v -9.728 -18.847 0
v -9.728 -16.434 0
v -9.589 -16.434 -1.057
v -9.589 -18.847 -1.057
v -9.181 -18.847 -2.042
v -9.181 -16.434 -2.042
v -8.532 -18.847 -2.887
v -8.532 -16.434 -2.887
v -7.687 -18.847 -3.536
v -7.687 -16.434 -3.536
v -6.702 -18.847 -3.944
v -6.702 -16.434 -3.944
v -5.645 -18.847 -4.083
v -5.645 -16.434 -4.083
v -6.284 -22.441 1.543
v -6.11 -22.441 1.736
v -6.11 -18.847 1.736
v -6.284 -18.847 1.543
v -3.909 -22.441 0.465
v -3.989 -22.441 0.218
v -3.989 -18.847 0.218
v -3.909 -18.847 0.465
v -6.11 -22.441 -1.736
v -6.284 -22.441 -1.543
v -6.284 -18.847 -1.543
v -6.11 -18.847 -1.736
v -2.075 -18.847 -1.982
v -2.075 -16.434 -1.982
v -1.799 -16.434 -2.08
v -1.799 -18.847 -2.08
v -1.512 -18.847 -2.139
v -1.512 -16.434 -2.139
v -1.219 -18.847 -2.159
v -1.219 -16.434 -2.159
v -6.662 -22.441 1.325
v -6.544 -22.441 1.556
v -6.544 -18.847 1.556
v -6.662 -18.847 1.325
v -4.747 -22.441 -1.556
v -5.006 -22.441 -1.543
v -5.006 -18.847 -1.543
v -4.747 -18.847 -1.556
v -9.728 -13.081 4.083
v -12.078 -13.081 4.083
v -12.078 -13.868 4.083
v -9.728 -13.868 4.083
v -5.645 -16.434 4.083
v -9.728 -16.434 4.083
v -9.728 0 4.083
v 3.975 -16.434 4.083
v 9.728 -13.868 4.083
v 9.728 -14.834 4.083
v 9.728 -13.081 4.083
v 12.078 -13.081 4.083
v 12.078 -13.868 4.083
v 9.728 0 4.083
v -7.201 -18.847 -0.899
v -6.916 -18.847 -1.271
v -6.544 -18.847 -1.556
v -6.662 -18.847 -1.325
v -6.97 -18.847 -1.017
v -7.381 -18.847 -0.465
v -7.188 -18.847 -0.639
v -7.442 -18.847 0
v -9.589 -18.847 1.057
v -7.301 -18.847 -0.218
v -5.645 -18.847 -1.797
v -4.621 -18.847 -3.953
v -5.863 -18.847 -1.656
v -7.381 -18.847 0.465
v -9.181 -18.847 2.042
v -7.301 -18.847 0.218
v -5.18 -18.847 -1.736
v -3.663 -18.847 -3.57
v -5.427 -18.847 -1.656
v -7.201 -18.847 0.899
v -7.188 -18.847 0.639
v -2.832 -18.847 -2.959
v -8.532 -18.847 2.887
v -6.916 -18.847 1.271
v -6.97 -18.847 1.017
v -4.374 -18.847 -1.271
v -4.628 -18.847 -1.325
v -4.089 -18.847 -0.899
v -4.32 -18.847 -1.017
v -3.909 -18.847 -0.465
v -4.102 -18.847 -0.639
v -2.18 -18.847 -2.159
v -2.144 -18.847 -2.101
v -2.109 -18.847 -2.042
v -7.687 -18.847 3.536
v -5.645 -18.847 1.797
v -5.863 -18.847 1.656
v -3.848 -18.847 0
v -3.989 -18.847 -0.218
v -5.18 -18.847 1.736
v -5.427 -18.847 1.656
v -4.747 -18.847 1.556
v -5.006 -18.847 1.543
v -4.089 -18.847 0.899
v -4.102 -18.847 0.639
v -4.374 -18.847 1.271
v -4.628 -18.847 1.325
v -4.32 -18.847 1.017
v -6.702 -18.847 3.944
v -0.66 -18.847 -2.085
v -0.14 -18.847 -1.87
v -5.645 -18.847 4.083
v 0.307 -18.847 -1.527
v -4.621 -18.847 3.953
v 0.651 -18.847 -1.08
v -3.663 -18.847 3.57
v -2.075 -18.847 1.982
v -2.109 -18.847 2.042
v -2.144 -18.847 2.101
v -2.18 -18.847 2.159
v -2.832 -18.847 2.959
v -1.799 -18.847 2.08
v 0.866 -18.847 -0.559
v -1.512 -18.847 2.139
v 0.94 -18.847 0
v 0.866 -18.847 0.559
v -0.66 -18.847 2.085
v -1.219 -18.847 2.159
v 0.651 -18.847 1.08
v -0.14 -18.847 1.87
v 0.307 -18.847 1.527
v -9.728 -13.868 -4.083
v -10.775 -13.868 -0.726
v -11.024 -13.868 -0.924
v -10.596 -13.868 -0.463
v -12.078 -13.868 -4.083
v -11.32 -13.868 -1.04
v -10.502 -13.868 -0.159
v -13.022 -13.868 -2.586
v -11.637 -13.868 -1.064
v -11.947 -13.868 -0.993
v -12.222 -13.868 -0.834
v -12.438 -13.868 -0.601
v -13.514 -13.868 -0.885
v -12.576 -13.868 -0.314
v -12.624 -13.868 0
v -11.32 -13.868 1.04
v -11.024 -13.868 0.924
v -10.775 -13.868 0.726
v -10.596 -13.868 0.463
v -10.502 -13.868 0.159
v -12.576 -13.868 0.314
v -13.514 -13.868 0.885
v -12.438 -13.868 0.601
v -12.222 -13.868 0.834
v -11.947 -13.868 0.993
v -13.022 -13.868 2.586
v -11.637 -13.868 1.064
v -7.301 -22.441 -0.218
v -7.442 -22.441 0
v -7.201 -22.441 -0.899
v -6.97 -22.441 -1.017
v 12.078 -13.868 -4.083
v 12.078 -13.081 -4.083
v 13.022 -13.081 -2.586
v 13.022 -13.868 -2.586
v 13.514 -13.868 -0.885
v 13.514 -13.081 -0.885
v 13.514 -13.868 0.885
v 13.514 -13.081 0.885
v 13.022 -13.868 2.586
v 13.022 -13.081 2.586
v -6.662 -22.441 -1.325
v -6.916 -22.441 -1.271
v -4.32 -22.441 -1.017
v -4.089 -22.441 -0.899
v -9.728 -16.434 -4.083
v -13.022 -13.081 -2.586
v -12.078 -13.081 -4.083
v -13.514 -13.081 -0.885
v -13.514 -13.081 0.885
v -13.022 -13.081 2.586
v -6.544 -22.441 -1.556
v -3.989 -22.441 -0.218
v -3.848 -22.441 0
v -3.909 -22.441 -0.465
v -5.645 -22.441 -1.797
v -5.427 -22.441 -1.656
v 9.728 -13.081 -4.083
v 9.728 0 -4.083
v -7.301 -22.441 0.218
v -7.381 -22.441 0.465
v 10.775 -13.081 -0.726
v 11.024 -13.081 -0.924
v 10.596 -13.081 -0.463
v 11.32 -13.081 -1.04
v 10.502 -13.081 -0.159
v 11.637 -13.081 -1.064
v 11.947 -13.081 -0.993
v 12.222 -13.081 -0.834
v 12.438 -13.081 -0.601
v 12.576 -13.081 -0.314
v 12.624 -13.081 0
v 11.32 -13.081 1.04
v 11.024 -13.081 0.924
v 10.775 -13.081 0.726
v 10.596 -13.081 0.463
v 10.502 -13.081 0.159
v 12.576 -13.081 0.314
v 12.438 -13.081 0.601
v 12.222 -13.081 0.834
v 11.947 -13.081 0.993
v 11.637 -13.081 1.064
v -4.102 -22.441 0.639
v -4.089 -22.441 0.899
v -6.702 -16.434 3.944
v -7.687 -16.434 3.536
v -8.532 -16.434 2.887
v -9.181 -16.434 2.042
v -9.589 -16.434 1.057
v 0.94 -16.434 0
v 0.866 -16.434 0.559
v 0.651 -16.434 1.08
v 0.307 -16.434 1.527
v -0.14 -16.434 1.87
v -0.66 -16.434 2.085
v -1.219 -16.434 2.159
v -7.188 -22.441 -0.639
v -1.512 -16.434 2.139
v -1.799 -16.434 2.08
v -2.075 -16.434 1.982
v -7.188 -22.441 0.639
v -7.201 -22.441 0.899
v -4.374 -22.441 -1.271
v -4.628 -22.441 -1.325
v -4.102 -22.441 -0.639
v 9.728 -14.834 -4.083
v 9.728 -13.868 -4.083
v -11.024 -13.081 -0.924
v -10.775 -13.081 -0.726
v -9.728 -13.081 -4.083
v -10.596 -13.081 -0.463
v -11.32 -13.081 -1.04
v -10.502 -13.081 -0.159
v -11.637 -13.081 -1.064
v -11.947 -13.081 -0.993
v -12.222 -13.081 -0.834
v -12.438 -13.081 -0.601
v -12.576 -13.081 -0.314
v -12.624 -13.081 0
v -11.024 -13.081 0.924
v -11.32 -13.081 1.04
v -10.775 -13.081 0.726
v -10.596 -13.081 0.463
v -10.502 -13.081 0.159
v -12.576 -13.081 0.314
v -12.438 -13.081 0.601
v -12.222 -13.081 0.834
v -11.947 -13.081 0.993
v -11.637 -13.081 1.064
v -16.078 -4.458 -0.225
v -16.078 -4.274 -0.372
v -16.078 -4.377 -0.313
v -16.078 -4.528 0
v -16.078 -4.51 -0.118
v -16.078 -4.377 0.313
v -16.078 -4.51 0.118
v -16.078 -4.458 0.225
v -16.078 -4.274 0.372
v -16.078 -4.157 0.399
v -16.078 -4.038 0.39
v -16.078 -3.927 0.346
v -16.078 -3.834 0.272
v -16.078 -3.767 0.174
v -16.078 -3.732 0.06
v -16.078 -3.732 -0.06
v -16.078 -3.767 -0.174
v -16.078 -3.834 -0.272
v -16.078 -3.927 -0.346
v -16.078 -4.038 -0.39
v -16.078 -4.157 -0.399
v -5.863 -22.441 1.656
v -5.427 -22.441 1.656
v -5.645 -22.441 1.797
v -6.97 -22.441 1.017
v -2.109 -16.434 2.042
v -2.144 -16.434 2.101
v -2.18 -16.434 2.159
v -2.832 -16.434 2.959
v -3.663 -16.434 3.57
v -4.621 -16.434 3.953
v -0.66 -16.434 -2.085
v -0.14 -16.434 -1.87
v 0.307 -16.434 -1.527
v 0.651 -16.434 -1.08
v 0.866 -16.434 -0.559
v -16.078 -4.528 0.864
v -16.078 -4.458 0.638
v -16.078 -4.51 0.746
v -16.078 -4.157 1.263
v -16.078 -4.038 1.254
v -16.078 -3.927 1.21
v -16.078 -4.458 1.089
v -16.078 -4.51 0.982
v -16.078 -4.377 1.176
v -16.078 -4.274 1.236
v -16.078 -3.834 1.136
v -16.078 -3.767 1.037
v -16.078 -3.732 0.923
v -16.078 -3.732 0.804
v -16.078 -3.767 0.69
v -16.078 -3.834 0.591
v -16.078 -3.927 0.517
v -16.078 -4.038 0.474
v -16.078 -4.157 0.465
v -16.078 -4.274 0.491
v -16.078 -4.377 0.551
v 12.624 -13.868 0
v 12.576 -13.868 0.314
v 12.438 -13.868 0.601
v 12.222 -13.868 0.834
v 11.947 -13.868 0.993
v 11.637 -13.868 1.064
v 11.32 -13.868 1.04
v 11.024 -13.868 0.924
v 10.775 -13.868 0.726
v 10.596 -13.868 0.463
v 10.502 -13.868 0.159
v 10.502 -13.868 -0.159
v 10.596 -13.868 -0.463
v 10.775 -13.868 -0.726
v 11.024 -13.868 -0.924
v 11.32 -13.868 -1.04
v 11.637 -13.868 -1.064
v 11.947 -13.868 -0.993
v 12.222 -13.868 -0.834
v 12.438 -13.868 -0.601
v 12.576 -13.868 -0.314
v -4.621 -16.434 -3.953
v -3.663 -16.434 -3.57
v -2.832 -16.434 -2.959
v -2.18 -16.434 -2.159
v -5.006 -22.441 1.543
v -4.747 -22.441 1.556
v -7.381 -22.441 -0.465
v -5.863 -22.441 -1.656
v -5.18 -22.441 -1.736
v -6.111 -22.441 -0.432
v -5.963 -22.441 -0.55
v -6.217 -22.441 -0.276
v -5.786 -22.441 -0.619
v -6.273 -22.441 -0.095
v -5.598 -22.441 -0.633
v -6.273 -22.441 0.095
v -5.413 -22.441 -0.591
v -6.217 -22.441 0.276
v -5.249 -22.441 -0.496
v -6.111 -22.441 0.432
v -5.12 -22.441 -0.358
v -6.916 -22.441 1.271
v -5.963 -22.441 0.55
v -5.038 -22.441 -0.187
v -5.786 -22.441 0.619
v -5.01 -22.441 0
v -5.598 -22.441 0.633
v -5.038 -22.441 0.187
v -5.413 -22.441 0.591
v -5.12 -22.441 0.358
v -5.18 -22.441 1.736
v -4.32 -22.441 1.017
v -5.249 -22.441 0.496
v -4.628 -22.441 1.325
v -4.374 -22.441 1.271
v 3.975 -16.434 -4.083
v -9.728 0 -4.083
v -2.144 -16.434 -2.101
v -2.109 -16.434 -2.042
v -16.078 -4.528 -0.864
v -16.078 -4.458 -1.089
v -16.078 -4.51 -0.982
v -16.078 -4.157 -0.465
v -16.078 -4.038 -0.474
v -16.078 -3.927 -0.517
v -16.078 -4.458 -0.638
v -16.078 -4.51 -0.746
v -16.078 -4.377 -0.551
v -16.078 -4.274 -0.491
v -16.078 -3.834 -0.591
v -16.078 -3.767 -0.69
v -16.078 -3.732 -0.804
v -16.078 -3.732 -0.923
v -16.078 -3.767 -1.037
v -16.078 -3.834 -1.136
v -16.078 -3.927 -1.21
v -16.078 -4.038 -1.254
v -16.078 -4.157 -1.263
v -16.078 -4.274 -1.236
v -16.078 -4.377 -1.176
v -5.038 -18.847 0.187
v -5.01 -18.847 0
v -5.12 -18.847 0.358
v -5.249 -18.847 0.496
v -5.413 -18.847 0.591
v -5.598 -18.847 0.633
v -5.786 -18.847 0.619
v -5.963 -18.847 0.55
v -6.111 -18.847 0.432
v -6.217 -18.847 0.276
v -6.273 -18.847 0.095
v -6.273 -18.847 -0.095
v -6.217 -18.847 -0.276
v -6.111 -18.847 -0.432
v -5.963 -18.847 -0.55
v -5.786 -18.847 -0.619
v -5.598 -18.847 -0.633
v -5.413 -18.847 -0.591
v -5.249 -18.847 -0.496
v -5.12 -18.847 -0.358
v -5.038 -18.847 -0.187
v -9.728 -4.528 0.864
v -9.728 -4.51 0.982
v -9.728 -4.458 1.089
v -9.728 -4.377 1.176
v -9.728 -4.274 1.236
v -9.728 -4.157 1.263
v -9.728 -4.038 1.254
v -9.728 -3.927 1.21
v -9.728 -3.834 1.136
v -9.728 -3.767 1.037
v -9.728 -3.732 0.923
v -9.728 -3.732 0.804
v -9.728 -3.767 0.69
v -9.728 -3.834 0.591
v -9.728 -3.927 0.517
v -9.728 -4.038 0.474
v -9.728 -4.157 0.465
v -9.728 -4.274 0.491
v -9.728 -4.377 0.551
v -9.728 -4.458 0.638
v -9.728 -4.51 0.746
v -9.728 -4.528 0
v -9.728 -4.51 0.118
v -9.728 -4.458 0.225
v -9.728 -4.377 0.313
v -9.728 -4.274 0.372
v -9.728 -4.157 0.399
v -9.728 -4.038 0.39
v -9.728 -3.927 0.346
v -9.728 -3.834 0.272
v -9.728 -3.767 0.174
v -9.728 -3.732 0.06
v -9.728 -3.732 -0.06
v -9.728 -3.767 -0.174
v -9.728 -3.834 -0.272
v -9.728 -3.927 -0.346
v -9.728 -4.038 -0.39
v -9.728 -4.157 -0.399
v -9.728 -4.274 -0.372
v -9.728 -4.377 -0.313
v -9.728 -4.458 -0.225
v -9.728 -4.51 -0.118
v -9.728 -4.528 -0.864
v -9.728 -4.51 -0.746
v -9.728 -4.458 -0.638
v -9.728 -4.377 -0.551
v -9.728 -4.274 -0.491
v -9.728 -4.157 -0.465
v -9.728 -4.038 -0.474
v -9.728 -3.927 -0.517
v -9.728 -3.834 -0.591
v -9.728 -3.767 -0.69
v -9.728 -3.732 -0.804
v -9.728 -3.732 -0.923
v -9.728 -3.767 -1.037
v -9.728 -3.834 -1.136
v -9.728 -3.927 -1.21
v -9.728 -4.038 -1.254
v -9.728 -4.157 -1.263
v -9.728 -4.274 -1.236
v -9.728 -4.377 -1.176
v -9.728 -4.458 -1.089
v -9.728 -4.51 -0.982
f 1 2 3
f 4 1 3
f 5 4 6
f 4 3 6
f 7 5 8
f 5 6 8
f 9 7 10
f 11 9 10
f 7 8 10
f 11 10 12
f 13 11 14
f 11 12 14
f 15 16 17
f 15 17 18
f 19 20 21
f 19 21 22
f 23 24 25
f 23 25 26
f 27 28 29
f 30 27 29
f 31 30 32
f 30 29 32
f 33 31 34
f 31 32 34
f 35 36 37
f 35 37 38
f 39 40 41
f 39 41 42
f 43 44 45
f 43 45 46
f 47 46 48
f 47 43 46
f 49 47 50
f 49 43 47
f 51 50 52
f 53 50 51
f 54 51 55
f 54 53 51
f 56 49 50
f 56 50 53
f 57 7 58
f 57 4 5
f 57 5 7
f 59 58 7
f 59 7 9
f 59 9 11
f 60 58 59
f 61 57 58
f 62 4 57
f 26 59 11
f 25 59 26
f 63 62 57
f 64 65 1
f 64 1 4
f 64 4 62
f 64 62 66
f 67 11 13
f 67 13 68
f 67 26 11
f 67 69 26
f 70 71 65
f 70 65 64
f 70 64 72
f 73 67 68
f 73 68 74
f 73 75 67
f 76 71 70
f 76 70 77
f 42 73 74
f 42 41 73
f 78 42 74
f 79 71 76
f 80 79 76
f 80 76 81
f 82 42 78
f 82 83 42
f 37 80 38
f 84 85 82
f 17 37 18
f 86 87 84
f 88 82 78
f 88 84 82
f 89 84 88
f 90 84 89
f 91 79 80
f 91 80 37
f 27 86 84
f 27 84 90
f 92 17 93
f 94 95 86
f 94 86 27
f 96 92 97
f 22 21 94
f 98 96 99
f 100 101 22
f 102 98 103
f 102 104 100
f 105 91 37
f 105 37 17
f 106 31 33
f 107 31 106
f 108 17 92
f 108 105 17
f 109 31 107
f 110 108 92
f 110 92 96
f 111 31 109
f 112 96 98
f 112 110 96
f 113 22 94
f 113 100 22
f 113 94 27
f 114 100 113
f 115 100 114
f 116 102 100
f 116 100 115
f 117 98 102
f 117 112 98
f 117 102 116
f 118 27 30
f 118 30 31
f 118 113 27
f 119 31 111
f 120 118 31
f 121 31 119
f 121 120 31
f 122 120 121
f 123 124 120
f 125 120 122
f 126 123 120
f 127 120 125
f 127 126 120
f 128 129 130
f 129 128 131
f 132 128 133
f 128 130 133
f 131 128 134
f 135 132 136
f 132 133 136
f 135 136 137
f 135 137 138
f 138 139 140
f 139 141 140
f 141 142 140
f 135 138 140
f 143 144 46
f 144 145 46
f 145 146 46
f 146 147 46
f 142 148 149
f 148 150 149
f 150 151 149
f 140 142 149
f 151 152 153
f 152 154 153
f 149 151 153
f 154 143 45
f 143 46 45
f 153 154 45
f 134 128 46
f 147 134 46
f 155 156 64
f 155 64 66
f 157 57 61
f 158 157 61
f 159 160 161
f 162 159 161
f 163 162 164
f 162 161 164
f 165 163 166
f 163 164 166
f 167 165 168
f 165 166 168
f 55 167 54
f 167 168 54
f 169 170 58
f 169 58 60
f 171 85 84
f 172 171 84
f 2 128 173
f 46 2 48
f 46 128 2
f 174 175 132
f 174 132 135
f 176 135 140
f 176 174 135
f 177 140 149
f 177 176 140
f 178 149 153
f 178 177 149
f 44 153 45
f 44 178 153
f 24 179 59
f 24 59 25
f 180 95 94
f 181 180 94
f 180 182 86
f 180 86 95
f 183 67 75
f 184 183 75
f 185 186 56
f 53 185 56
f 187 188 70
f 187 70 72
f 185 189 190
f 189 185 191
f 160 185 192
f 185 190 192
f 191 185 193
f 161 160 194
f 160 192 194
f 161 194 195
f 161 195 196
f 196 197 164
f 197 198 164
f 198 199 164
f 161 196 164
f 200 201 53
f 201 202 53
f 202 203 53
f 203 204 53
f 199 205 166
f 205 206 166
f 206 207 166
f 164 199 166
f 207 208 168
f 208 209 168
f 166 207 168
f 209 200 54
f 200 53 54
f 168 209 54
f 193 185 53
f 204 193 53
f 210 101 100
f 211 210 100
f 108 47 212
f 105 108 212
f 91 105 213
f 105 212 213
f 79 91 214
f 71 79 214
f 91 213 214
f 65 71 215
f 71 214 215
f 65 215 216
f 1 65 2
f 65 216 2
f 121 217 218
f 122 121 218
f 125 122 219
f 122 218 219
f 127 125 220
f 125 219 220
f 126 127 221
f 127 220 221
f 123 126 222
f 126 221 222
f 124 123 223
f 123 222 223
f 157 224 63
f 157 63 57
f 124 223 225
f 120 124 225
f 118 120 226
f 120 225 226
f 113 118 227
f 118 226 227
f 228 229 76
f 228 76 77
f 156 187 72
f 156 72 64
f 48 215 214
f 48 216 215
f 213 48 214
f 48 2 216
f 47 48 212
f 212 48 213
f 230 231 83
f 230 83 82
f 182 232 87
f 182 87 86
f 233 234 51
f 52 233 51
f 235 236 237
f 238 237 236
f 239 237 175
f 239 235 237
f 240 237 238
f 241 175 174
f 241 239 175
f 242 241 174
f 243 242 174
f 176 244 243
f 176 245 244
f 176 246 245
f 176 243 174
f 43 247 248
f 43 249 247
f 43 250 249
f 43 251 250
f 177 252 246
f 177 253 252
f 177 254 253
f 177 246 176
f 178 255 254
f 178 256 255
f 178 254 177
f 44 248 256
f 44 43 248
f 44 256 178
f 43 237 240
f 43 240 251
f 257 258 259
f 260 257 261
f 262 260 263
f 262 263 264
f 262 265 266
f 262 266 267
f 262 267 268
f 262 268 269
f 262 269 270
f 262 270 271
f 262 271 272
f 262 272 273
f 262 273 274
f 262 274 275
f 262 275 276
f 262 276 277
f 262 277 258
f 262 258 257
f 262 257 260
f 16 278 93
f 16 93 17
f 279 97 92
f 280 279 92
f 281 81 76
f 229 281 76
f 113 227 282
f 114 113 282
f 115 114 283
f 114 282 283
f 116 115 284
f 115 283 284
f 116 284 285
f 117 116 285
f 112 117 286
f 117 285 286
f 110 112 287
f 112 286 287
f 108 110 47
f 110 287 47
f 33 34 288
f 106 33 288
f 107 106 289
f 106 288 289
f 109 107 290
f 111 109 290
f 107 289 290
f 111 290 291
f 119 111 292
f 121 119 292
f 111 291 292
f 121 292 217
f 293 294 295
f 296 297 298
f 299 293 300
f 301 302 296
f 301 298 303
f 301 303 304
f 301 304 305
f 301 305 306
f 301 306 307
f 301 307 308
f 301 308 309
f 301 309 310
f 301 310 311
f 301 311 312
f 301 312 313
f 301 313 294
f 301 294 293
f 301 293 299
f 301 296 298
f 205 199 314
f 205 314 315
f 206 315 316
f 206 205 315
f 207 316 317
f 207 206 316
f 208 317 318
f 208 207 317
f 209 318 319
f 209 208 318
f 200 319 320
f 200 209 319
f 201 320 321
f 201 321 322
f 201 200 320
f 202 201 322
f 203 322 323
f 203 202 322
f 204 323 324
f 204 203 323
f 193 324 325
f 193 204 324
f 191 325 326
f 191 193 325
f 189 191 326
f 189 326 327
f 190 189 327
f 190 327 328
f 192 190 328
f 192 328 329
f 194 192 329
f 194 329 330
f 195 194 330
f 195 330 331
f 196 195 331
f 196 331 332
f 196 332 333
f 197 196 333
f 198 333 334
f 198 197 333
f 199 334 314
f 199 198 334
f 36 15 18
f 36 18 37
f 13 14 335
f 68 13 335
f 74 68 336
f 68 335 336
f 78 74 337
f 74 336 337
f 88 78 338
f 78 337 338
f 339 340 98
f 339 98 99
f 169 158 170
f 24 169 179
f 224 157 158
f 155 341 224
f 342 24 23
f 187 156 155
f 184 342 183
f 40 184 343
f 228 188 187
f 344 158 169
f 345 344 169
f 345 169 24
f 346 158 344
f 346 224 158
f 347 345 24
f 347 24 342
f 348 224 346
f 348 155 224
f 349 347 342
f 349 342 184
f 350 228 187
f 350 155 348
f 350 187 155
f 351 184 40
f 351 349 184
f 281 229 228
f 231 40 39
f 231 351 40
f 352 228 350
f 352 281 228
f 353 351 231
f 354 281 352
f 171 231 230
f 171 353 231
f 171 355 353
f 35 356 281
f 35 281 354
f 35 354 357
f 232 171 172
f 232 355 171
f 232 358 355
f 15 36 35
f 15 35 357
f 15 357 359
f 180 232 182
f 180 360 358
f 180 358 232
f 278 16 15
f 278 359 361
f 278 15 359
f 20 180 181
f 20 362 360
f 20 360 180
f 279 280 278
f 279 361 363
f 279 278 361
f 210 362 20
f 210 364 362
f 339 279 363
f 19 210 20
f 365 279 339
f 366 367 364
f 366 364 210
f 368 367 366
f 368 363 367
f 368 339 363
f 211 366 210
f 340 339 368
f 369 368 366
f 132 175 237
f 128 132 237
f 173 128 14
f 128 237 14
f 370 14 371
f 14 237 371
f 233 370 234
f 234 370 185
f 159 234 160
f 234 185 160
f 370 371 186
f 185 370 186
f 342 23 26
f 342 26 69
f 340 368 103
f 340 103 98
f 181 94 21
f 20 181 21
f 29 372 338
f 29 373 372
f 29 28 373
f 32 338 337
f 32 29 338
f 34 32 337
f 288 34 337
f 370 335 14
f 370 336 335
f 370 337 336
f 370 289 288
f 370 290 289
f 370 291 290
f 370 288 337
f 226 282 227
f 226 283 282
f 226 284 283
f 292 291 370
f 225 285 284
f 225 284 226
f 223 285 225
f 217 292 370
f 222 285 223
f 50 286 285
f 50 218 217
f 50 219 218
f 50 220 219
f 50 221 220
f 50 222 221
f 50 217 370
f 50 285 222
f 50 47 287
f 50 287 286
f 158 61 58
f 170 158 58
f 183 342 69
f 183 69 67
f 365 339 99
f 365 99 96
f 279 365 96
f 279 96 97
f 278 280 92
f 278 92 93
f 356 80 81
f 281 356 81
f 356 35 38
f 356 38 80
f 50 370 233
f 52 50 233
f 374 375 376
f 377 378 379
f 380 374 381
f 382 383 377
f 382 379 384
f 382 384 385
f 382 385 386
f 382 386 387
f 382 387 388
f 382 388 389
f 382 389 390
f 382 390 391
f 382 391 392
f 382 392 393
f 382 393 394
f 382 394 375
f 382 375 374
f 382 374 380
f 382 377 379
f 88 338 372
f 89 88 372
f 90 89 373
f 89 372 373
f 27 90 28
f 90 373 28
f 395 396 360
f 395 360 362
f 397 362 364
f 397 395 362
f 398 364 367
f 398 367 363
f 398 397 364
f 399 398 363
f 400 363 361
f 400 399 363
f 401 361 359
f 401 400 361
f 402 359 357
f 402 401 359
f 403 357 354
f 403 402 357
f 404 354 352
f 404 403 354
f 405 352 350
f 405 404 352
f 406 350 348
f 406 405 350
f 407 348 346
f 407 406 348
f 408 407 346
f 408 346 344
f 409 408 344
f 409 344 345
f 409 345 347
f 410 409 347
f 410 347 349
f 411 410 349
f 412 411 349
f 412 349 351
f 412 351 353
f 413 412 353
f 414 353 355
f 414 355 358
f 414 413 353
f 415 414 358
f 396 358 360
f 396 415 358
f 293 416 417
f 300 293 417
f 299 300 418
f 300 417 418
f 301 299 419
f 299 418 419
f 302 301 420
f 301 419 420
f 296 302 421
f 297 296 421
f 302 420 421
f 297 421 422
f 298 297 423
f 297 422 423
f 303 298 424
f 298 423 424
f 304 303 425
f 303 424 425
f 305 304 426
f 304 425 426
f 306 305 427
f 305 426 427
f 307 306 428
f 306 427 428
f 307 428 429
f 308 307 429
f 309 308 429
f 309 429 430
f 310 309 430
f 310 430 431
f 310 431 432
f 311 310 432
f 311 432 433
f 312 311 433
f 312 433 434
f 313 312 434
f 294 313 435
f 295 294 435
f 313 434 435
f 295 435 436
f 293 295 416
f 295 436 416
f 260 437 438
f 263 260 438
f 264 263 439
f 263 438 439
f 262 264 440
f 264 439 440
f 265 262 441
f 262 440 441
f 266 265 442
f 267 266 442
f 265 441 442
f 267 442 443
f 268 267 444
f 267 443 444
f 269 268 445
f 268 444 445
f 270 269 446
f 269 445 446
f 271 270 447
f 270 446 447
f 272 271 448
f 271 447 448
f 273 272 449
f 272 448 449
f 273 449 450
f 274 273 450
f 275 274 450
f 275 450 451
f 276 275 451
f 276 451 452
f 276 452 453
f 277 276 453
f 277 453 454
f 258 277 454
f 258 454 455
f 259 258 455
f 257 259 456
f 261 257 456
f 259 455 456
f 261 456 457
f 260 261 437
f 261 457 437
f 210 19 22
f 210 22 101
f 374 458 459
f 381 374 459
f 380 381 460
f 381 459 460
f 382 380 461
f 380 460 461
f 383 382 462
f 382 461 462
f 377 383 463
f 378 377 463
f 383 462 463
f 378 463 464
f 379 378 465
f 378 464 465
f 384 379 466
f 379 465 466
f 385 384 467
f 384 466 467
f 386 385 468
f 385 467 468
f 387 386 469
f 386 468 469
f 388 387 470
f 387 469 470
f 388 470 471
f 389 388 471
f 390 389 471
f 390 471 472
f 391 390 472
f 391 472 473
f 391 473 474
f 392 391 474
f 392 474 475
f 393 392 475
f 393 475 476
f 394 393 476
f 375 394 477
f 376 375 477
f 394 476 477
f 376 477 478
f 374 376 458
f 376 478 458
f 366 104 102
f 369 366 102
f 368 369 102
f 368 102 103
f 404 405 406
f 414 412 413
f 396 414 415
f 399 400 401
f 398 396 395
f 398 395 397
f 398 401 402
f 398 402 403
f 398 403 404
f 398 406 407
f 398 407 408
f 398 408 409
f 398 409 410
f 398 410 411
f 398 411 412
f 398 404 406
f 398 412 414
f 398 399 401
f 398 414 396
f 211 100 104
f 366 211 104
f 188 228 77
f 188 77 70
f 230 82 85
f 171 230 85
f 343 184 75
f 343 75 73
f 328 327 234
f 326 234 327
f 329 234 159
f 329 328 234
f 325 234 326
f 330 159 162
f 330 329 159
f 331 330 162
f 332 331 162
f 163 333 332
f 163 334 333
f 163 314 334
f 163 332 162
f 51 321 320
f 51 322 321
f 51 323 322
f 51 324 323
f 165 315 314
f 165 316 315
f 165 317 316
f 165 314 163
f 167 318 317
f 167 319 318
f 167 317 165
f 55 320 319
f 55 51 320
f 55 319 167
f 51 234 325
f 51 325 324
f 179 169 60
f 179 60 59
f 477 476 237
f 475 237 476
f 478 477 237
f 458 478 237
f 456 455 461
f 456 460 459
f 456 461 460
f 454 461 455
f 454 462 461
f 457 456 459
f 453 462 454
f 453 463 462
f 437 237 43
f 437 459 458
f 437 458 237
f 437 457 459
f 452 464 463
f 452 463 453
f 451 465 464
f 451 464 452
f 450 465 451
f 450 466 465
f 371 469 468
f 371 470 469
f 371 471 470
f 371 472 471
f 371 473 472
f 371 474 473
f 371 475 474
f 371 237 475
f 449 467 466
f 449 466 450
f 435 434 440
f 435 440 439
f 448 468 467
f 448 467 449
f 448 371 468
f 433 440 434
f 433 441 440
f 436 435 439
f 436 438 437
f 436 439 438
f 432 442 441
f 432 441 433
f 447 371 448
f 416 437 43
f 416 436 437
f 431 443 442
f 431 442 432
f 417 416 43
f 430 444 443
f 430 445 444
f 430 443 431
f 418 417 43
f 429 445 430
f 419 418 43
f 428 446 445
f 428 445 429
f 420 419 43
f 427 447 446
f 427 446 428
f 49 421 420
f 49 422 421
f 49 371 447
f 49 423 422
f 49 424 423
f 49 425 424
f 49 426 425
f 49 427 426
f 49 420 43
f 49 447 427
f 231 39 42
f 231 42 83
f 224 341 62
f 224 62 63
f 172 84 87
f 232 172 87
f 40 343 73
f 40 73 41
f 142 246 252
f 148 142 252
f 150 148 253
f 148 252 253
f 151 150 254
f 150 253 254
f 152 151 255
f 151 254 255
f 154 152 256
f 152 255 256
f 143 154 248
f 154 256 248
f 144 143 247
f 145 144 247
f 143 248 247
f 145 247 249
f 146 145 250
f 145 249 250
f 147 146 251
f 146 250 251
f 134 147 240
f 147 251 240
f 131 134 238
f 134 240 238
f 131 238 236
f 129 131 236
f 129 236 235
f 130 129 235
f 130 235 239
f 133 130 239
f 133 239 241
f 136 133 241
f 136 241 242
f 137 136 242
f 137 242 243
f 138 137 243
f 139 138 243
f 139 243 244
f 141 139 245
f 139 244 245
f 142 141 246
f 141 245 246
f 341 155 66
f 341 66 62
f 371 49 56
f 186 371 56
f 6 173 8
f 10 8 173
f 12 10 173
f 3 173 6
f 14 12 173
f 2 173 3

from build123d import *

# Parameters (mm, degrees)
F0_W      = 19.4564
F0_H      = 8.1661
F1_DEPTH  = 16.4338
F3_DEPTH  = 8.1661
F5_DEPTH  = 2.413
F6_R      = 0.635
F7_DEPTH  = 3.5941
F9_R      = 1.0668
F10_DEPTH = 0.7874
F11_R     = 0.40005
F12_DEPTH = 6.35


# Not quite as in the source:
# - a pattern or mirror of a feature is missing from the dataset's text; its kind, count and spacing are read off the source's solid


with BuildPart() as f1:
    # F0 (on Front) → F1 (new body)
    with BuildSketch(Plane.XZ):
        Rectangle(F0_W, F0_H)
    extrude(amount=F1_DEPTH)

    # F2 (on face) → F3 (cut, through all)
    with BuildSketch(Plane(origin=(0, 0, -4.08305), x_dir=(1, 0, 0), z_dir=(0, 0, -1))):
        Polygon((3.9751, 16.4338), (9.7282, 14.8336), (9.7282, 16.4338), align=None)
    extrude(amount=-F3_DEPTH, mode=Mode.SUBTRACT)

    # F4 (on face) → F5 (join)
    with BuildSketch(Plane.XZ.offset(16.4338)):
        with BuildLine():
            ThreePointArc((-2.0754022956, -1.9819683724), (-3.3782, 0), (-2.0754022956, 1.9819683724))
            ThreePointArc((-2.0754022956, 1.9819683724), (-2.1263891254, 2.071139592), (-2.1796029577, 2.159))
            ThreePointArc((-2.1796029577, 2.159), (-3.6632327094, 3.5697760652), (-5.6451500171, 4.08305))
            ThreePointArc((-5.6451500171, 4.08305), (-8.532302349, 2.8871523369), (-9.7282, 0))
            ThreePointArc((-9.7282, 0), (-8.5323023429, -2.8871523429), (-5.64515, -4.08305))
            ThreePointArc((-5.64515, -4.08305), (-3.663232702, -3.5697760611), (-2.1796029577, -2.159))
            ThreePointArc((-2.1796029577, -2.159), (-2.1263891254, -2.071139592), (-2.0754022956, -1.9819683724))
        make_face()
        with BuildLine():
            ThreePointArc((-2.0754022956, -1.9819683724), (-1.6925081197, -1.023679378), (-1.5621, 0))
            ThreePointArc((-1.5621, 0), (-1.6925081197, 1.023679378), (-2.0754022956, 1.9819683724))
            ThreePointArc((-2.0754022956, 1.9819683724), (-3.3782, 0), (-2.0754022956, -1.9819683724))
        make_face()
        with BuildLine():
            ThreePointArc((-2.0754022956, 1.9819683724), (-1.6925081197, 1.023679378), (-1.5621, 0))
            ThreePointArc((-1.5621, 0), (-1.6925081197, -1.023679378), (-2.0754022956, -1.9819683724))
            ThreePointArc((-2.0754022956, -1.9819683724), (-1.656356313, -2.1142789215), (-1.2192, -2.159))
            ThreePointArc((-1.2192, -2.159), (0.3074435406, -1.5266435406), (0.9398, 0))
            ThreePointArc((0.9398, 0), (0.3074435406, 1.5266435406), (-1.2192, 2.159))
            ThreePointArc((-1.2192, 2.159), (-1.656356313, 2.1142789215), (-2.0754022956, 1.9819683724))
        make_face()
    extrude(amount=F5_DEPTH)

    # F6 (on face) → F7 (join)
    with BuildSketch(Plane.XZ.offset(18.8468)):
        Polygon((-5.4271647327, 1.6557624907), (-5.64515, 1.79705), (-5.8631352673, 1.6557624907), (-6.110260765, 1.7358170061), (-6.2842504662, 1.5429250133), (-6.543675, 1.5562909519), (-6.6618120245, 1.324939746), (-6.9158562411, 1.2707062411), (-6.970089746, 1.0166620245), (-7.2014409519, 0.898525), (-7.1880750133, 0.6391004662), (-7.3809670061, 0.465110765), (-7.3009124907, 0.2179852673), (-7.4422, 0), (-7.3009124907, -0.2179852673), (-7.3809670061, -0.465110765), (-7.1880750133, -0.6391004662), (-7.2014409519, -0.898525), (-6.970089746, -1.0166620245), (-6.9158562411, -1.2707062411), (-6.6618120245, -1.324939746), (-6.543675, -1.5562909519), (-6.2842504662, -1.5429250133), (-6.110260765, -1.7358170061), (-5.8631352673, -1.6557624907), (-5.64515, -1.79705), (-5.4271647327, -1.6557624907), (-5.180039235, -1.7358170061), (-5.0060495338, -1.5429250133), (-4.746625, -1.5562909519), (-4.6284879755, -1.324939746), (-4.3744437589, -1.2707062411), (-4.320210254, -1.0166620245), (-4.0888590481, -0.898525), (-4.1022249867, -0.6391004662), (-3.9093329939, -0.465110765), (-3.9893875093, -0.2179852673), (-3.8481, 0), (-3.9893875093, 0.2179852673), (-3.9093329939, 0.465110765), (-4.1022249867, 0.6391004662), (-4.0888590481, 0.898525), (-4.320210254, 1.0166620245), (-4.3744437589, 1.2707062411), (-4.6284879755, 1.324939746), (-4.746625, 1.5562909519), (-5.0060495338, 1.5429250133), (-5.180039235, 1.7358170061), align=None)
        with Locations((-5.64515, 0)):
            Circle(F6_R, mode=Mode.SUBTRACT)
    extrude(amount=F7_DEPTH)

    # F9 (on offset) → F10 (join)
    with BuildSketch(Plane.XZ.offset(13.081)):
        with BuildLine():
            Line((12.0777, 4.08305), (9.7282, 4.08305))
            Line((9.7282, 4.08305), (9.7282, -4.08305))
            Line((9.7282, -4.08305), (12.0777, -4.08305))
            ThreePointArc((12.0777, -4.08305), (13.5763, 0), (12.0777, 4.08305))
        make_face()
        with Locations((11.557, 0)):
            Circle(F9_R, mode=Mode.SUBTRACT)
    f10 = extrude(amount=F10_DEPTH)

    # F10_copies: F10 across plane
    add(f10.mirror(Plane(origin=(0, 0, 0), x_dir=(0, 0, -1), z_dir=(-1, 0, 0))))

    # F11 (on face) → F12 (join)
    with BuildSketch(Plane(origin=(-9.7282, 0, 0), x_dir=(0, -1, 0), z_dir=(-1, 0, 0))):
        with Locations((4.1275, 0.8636)):
            Circle(F11_R)
        with Locations((4.1275, 0)):
            Circle(F11_R)
        with Locations((4.1275, -0.8636)):
            Circle(F11_R)
    extrude(amount=F12_DEPTH)


solid = f1.part
